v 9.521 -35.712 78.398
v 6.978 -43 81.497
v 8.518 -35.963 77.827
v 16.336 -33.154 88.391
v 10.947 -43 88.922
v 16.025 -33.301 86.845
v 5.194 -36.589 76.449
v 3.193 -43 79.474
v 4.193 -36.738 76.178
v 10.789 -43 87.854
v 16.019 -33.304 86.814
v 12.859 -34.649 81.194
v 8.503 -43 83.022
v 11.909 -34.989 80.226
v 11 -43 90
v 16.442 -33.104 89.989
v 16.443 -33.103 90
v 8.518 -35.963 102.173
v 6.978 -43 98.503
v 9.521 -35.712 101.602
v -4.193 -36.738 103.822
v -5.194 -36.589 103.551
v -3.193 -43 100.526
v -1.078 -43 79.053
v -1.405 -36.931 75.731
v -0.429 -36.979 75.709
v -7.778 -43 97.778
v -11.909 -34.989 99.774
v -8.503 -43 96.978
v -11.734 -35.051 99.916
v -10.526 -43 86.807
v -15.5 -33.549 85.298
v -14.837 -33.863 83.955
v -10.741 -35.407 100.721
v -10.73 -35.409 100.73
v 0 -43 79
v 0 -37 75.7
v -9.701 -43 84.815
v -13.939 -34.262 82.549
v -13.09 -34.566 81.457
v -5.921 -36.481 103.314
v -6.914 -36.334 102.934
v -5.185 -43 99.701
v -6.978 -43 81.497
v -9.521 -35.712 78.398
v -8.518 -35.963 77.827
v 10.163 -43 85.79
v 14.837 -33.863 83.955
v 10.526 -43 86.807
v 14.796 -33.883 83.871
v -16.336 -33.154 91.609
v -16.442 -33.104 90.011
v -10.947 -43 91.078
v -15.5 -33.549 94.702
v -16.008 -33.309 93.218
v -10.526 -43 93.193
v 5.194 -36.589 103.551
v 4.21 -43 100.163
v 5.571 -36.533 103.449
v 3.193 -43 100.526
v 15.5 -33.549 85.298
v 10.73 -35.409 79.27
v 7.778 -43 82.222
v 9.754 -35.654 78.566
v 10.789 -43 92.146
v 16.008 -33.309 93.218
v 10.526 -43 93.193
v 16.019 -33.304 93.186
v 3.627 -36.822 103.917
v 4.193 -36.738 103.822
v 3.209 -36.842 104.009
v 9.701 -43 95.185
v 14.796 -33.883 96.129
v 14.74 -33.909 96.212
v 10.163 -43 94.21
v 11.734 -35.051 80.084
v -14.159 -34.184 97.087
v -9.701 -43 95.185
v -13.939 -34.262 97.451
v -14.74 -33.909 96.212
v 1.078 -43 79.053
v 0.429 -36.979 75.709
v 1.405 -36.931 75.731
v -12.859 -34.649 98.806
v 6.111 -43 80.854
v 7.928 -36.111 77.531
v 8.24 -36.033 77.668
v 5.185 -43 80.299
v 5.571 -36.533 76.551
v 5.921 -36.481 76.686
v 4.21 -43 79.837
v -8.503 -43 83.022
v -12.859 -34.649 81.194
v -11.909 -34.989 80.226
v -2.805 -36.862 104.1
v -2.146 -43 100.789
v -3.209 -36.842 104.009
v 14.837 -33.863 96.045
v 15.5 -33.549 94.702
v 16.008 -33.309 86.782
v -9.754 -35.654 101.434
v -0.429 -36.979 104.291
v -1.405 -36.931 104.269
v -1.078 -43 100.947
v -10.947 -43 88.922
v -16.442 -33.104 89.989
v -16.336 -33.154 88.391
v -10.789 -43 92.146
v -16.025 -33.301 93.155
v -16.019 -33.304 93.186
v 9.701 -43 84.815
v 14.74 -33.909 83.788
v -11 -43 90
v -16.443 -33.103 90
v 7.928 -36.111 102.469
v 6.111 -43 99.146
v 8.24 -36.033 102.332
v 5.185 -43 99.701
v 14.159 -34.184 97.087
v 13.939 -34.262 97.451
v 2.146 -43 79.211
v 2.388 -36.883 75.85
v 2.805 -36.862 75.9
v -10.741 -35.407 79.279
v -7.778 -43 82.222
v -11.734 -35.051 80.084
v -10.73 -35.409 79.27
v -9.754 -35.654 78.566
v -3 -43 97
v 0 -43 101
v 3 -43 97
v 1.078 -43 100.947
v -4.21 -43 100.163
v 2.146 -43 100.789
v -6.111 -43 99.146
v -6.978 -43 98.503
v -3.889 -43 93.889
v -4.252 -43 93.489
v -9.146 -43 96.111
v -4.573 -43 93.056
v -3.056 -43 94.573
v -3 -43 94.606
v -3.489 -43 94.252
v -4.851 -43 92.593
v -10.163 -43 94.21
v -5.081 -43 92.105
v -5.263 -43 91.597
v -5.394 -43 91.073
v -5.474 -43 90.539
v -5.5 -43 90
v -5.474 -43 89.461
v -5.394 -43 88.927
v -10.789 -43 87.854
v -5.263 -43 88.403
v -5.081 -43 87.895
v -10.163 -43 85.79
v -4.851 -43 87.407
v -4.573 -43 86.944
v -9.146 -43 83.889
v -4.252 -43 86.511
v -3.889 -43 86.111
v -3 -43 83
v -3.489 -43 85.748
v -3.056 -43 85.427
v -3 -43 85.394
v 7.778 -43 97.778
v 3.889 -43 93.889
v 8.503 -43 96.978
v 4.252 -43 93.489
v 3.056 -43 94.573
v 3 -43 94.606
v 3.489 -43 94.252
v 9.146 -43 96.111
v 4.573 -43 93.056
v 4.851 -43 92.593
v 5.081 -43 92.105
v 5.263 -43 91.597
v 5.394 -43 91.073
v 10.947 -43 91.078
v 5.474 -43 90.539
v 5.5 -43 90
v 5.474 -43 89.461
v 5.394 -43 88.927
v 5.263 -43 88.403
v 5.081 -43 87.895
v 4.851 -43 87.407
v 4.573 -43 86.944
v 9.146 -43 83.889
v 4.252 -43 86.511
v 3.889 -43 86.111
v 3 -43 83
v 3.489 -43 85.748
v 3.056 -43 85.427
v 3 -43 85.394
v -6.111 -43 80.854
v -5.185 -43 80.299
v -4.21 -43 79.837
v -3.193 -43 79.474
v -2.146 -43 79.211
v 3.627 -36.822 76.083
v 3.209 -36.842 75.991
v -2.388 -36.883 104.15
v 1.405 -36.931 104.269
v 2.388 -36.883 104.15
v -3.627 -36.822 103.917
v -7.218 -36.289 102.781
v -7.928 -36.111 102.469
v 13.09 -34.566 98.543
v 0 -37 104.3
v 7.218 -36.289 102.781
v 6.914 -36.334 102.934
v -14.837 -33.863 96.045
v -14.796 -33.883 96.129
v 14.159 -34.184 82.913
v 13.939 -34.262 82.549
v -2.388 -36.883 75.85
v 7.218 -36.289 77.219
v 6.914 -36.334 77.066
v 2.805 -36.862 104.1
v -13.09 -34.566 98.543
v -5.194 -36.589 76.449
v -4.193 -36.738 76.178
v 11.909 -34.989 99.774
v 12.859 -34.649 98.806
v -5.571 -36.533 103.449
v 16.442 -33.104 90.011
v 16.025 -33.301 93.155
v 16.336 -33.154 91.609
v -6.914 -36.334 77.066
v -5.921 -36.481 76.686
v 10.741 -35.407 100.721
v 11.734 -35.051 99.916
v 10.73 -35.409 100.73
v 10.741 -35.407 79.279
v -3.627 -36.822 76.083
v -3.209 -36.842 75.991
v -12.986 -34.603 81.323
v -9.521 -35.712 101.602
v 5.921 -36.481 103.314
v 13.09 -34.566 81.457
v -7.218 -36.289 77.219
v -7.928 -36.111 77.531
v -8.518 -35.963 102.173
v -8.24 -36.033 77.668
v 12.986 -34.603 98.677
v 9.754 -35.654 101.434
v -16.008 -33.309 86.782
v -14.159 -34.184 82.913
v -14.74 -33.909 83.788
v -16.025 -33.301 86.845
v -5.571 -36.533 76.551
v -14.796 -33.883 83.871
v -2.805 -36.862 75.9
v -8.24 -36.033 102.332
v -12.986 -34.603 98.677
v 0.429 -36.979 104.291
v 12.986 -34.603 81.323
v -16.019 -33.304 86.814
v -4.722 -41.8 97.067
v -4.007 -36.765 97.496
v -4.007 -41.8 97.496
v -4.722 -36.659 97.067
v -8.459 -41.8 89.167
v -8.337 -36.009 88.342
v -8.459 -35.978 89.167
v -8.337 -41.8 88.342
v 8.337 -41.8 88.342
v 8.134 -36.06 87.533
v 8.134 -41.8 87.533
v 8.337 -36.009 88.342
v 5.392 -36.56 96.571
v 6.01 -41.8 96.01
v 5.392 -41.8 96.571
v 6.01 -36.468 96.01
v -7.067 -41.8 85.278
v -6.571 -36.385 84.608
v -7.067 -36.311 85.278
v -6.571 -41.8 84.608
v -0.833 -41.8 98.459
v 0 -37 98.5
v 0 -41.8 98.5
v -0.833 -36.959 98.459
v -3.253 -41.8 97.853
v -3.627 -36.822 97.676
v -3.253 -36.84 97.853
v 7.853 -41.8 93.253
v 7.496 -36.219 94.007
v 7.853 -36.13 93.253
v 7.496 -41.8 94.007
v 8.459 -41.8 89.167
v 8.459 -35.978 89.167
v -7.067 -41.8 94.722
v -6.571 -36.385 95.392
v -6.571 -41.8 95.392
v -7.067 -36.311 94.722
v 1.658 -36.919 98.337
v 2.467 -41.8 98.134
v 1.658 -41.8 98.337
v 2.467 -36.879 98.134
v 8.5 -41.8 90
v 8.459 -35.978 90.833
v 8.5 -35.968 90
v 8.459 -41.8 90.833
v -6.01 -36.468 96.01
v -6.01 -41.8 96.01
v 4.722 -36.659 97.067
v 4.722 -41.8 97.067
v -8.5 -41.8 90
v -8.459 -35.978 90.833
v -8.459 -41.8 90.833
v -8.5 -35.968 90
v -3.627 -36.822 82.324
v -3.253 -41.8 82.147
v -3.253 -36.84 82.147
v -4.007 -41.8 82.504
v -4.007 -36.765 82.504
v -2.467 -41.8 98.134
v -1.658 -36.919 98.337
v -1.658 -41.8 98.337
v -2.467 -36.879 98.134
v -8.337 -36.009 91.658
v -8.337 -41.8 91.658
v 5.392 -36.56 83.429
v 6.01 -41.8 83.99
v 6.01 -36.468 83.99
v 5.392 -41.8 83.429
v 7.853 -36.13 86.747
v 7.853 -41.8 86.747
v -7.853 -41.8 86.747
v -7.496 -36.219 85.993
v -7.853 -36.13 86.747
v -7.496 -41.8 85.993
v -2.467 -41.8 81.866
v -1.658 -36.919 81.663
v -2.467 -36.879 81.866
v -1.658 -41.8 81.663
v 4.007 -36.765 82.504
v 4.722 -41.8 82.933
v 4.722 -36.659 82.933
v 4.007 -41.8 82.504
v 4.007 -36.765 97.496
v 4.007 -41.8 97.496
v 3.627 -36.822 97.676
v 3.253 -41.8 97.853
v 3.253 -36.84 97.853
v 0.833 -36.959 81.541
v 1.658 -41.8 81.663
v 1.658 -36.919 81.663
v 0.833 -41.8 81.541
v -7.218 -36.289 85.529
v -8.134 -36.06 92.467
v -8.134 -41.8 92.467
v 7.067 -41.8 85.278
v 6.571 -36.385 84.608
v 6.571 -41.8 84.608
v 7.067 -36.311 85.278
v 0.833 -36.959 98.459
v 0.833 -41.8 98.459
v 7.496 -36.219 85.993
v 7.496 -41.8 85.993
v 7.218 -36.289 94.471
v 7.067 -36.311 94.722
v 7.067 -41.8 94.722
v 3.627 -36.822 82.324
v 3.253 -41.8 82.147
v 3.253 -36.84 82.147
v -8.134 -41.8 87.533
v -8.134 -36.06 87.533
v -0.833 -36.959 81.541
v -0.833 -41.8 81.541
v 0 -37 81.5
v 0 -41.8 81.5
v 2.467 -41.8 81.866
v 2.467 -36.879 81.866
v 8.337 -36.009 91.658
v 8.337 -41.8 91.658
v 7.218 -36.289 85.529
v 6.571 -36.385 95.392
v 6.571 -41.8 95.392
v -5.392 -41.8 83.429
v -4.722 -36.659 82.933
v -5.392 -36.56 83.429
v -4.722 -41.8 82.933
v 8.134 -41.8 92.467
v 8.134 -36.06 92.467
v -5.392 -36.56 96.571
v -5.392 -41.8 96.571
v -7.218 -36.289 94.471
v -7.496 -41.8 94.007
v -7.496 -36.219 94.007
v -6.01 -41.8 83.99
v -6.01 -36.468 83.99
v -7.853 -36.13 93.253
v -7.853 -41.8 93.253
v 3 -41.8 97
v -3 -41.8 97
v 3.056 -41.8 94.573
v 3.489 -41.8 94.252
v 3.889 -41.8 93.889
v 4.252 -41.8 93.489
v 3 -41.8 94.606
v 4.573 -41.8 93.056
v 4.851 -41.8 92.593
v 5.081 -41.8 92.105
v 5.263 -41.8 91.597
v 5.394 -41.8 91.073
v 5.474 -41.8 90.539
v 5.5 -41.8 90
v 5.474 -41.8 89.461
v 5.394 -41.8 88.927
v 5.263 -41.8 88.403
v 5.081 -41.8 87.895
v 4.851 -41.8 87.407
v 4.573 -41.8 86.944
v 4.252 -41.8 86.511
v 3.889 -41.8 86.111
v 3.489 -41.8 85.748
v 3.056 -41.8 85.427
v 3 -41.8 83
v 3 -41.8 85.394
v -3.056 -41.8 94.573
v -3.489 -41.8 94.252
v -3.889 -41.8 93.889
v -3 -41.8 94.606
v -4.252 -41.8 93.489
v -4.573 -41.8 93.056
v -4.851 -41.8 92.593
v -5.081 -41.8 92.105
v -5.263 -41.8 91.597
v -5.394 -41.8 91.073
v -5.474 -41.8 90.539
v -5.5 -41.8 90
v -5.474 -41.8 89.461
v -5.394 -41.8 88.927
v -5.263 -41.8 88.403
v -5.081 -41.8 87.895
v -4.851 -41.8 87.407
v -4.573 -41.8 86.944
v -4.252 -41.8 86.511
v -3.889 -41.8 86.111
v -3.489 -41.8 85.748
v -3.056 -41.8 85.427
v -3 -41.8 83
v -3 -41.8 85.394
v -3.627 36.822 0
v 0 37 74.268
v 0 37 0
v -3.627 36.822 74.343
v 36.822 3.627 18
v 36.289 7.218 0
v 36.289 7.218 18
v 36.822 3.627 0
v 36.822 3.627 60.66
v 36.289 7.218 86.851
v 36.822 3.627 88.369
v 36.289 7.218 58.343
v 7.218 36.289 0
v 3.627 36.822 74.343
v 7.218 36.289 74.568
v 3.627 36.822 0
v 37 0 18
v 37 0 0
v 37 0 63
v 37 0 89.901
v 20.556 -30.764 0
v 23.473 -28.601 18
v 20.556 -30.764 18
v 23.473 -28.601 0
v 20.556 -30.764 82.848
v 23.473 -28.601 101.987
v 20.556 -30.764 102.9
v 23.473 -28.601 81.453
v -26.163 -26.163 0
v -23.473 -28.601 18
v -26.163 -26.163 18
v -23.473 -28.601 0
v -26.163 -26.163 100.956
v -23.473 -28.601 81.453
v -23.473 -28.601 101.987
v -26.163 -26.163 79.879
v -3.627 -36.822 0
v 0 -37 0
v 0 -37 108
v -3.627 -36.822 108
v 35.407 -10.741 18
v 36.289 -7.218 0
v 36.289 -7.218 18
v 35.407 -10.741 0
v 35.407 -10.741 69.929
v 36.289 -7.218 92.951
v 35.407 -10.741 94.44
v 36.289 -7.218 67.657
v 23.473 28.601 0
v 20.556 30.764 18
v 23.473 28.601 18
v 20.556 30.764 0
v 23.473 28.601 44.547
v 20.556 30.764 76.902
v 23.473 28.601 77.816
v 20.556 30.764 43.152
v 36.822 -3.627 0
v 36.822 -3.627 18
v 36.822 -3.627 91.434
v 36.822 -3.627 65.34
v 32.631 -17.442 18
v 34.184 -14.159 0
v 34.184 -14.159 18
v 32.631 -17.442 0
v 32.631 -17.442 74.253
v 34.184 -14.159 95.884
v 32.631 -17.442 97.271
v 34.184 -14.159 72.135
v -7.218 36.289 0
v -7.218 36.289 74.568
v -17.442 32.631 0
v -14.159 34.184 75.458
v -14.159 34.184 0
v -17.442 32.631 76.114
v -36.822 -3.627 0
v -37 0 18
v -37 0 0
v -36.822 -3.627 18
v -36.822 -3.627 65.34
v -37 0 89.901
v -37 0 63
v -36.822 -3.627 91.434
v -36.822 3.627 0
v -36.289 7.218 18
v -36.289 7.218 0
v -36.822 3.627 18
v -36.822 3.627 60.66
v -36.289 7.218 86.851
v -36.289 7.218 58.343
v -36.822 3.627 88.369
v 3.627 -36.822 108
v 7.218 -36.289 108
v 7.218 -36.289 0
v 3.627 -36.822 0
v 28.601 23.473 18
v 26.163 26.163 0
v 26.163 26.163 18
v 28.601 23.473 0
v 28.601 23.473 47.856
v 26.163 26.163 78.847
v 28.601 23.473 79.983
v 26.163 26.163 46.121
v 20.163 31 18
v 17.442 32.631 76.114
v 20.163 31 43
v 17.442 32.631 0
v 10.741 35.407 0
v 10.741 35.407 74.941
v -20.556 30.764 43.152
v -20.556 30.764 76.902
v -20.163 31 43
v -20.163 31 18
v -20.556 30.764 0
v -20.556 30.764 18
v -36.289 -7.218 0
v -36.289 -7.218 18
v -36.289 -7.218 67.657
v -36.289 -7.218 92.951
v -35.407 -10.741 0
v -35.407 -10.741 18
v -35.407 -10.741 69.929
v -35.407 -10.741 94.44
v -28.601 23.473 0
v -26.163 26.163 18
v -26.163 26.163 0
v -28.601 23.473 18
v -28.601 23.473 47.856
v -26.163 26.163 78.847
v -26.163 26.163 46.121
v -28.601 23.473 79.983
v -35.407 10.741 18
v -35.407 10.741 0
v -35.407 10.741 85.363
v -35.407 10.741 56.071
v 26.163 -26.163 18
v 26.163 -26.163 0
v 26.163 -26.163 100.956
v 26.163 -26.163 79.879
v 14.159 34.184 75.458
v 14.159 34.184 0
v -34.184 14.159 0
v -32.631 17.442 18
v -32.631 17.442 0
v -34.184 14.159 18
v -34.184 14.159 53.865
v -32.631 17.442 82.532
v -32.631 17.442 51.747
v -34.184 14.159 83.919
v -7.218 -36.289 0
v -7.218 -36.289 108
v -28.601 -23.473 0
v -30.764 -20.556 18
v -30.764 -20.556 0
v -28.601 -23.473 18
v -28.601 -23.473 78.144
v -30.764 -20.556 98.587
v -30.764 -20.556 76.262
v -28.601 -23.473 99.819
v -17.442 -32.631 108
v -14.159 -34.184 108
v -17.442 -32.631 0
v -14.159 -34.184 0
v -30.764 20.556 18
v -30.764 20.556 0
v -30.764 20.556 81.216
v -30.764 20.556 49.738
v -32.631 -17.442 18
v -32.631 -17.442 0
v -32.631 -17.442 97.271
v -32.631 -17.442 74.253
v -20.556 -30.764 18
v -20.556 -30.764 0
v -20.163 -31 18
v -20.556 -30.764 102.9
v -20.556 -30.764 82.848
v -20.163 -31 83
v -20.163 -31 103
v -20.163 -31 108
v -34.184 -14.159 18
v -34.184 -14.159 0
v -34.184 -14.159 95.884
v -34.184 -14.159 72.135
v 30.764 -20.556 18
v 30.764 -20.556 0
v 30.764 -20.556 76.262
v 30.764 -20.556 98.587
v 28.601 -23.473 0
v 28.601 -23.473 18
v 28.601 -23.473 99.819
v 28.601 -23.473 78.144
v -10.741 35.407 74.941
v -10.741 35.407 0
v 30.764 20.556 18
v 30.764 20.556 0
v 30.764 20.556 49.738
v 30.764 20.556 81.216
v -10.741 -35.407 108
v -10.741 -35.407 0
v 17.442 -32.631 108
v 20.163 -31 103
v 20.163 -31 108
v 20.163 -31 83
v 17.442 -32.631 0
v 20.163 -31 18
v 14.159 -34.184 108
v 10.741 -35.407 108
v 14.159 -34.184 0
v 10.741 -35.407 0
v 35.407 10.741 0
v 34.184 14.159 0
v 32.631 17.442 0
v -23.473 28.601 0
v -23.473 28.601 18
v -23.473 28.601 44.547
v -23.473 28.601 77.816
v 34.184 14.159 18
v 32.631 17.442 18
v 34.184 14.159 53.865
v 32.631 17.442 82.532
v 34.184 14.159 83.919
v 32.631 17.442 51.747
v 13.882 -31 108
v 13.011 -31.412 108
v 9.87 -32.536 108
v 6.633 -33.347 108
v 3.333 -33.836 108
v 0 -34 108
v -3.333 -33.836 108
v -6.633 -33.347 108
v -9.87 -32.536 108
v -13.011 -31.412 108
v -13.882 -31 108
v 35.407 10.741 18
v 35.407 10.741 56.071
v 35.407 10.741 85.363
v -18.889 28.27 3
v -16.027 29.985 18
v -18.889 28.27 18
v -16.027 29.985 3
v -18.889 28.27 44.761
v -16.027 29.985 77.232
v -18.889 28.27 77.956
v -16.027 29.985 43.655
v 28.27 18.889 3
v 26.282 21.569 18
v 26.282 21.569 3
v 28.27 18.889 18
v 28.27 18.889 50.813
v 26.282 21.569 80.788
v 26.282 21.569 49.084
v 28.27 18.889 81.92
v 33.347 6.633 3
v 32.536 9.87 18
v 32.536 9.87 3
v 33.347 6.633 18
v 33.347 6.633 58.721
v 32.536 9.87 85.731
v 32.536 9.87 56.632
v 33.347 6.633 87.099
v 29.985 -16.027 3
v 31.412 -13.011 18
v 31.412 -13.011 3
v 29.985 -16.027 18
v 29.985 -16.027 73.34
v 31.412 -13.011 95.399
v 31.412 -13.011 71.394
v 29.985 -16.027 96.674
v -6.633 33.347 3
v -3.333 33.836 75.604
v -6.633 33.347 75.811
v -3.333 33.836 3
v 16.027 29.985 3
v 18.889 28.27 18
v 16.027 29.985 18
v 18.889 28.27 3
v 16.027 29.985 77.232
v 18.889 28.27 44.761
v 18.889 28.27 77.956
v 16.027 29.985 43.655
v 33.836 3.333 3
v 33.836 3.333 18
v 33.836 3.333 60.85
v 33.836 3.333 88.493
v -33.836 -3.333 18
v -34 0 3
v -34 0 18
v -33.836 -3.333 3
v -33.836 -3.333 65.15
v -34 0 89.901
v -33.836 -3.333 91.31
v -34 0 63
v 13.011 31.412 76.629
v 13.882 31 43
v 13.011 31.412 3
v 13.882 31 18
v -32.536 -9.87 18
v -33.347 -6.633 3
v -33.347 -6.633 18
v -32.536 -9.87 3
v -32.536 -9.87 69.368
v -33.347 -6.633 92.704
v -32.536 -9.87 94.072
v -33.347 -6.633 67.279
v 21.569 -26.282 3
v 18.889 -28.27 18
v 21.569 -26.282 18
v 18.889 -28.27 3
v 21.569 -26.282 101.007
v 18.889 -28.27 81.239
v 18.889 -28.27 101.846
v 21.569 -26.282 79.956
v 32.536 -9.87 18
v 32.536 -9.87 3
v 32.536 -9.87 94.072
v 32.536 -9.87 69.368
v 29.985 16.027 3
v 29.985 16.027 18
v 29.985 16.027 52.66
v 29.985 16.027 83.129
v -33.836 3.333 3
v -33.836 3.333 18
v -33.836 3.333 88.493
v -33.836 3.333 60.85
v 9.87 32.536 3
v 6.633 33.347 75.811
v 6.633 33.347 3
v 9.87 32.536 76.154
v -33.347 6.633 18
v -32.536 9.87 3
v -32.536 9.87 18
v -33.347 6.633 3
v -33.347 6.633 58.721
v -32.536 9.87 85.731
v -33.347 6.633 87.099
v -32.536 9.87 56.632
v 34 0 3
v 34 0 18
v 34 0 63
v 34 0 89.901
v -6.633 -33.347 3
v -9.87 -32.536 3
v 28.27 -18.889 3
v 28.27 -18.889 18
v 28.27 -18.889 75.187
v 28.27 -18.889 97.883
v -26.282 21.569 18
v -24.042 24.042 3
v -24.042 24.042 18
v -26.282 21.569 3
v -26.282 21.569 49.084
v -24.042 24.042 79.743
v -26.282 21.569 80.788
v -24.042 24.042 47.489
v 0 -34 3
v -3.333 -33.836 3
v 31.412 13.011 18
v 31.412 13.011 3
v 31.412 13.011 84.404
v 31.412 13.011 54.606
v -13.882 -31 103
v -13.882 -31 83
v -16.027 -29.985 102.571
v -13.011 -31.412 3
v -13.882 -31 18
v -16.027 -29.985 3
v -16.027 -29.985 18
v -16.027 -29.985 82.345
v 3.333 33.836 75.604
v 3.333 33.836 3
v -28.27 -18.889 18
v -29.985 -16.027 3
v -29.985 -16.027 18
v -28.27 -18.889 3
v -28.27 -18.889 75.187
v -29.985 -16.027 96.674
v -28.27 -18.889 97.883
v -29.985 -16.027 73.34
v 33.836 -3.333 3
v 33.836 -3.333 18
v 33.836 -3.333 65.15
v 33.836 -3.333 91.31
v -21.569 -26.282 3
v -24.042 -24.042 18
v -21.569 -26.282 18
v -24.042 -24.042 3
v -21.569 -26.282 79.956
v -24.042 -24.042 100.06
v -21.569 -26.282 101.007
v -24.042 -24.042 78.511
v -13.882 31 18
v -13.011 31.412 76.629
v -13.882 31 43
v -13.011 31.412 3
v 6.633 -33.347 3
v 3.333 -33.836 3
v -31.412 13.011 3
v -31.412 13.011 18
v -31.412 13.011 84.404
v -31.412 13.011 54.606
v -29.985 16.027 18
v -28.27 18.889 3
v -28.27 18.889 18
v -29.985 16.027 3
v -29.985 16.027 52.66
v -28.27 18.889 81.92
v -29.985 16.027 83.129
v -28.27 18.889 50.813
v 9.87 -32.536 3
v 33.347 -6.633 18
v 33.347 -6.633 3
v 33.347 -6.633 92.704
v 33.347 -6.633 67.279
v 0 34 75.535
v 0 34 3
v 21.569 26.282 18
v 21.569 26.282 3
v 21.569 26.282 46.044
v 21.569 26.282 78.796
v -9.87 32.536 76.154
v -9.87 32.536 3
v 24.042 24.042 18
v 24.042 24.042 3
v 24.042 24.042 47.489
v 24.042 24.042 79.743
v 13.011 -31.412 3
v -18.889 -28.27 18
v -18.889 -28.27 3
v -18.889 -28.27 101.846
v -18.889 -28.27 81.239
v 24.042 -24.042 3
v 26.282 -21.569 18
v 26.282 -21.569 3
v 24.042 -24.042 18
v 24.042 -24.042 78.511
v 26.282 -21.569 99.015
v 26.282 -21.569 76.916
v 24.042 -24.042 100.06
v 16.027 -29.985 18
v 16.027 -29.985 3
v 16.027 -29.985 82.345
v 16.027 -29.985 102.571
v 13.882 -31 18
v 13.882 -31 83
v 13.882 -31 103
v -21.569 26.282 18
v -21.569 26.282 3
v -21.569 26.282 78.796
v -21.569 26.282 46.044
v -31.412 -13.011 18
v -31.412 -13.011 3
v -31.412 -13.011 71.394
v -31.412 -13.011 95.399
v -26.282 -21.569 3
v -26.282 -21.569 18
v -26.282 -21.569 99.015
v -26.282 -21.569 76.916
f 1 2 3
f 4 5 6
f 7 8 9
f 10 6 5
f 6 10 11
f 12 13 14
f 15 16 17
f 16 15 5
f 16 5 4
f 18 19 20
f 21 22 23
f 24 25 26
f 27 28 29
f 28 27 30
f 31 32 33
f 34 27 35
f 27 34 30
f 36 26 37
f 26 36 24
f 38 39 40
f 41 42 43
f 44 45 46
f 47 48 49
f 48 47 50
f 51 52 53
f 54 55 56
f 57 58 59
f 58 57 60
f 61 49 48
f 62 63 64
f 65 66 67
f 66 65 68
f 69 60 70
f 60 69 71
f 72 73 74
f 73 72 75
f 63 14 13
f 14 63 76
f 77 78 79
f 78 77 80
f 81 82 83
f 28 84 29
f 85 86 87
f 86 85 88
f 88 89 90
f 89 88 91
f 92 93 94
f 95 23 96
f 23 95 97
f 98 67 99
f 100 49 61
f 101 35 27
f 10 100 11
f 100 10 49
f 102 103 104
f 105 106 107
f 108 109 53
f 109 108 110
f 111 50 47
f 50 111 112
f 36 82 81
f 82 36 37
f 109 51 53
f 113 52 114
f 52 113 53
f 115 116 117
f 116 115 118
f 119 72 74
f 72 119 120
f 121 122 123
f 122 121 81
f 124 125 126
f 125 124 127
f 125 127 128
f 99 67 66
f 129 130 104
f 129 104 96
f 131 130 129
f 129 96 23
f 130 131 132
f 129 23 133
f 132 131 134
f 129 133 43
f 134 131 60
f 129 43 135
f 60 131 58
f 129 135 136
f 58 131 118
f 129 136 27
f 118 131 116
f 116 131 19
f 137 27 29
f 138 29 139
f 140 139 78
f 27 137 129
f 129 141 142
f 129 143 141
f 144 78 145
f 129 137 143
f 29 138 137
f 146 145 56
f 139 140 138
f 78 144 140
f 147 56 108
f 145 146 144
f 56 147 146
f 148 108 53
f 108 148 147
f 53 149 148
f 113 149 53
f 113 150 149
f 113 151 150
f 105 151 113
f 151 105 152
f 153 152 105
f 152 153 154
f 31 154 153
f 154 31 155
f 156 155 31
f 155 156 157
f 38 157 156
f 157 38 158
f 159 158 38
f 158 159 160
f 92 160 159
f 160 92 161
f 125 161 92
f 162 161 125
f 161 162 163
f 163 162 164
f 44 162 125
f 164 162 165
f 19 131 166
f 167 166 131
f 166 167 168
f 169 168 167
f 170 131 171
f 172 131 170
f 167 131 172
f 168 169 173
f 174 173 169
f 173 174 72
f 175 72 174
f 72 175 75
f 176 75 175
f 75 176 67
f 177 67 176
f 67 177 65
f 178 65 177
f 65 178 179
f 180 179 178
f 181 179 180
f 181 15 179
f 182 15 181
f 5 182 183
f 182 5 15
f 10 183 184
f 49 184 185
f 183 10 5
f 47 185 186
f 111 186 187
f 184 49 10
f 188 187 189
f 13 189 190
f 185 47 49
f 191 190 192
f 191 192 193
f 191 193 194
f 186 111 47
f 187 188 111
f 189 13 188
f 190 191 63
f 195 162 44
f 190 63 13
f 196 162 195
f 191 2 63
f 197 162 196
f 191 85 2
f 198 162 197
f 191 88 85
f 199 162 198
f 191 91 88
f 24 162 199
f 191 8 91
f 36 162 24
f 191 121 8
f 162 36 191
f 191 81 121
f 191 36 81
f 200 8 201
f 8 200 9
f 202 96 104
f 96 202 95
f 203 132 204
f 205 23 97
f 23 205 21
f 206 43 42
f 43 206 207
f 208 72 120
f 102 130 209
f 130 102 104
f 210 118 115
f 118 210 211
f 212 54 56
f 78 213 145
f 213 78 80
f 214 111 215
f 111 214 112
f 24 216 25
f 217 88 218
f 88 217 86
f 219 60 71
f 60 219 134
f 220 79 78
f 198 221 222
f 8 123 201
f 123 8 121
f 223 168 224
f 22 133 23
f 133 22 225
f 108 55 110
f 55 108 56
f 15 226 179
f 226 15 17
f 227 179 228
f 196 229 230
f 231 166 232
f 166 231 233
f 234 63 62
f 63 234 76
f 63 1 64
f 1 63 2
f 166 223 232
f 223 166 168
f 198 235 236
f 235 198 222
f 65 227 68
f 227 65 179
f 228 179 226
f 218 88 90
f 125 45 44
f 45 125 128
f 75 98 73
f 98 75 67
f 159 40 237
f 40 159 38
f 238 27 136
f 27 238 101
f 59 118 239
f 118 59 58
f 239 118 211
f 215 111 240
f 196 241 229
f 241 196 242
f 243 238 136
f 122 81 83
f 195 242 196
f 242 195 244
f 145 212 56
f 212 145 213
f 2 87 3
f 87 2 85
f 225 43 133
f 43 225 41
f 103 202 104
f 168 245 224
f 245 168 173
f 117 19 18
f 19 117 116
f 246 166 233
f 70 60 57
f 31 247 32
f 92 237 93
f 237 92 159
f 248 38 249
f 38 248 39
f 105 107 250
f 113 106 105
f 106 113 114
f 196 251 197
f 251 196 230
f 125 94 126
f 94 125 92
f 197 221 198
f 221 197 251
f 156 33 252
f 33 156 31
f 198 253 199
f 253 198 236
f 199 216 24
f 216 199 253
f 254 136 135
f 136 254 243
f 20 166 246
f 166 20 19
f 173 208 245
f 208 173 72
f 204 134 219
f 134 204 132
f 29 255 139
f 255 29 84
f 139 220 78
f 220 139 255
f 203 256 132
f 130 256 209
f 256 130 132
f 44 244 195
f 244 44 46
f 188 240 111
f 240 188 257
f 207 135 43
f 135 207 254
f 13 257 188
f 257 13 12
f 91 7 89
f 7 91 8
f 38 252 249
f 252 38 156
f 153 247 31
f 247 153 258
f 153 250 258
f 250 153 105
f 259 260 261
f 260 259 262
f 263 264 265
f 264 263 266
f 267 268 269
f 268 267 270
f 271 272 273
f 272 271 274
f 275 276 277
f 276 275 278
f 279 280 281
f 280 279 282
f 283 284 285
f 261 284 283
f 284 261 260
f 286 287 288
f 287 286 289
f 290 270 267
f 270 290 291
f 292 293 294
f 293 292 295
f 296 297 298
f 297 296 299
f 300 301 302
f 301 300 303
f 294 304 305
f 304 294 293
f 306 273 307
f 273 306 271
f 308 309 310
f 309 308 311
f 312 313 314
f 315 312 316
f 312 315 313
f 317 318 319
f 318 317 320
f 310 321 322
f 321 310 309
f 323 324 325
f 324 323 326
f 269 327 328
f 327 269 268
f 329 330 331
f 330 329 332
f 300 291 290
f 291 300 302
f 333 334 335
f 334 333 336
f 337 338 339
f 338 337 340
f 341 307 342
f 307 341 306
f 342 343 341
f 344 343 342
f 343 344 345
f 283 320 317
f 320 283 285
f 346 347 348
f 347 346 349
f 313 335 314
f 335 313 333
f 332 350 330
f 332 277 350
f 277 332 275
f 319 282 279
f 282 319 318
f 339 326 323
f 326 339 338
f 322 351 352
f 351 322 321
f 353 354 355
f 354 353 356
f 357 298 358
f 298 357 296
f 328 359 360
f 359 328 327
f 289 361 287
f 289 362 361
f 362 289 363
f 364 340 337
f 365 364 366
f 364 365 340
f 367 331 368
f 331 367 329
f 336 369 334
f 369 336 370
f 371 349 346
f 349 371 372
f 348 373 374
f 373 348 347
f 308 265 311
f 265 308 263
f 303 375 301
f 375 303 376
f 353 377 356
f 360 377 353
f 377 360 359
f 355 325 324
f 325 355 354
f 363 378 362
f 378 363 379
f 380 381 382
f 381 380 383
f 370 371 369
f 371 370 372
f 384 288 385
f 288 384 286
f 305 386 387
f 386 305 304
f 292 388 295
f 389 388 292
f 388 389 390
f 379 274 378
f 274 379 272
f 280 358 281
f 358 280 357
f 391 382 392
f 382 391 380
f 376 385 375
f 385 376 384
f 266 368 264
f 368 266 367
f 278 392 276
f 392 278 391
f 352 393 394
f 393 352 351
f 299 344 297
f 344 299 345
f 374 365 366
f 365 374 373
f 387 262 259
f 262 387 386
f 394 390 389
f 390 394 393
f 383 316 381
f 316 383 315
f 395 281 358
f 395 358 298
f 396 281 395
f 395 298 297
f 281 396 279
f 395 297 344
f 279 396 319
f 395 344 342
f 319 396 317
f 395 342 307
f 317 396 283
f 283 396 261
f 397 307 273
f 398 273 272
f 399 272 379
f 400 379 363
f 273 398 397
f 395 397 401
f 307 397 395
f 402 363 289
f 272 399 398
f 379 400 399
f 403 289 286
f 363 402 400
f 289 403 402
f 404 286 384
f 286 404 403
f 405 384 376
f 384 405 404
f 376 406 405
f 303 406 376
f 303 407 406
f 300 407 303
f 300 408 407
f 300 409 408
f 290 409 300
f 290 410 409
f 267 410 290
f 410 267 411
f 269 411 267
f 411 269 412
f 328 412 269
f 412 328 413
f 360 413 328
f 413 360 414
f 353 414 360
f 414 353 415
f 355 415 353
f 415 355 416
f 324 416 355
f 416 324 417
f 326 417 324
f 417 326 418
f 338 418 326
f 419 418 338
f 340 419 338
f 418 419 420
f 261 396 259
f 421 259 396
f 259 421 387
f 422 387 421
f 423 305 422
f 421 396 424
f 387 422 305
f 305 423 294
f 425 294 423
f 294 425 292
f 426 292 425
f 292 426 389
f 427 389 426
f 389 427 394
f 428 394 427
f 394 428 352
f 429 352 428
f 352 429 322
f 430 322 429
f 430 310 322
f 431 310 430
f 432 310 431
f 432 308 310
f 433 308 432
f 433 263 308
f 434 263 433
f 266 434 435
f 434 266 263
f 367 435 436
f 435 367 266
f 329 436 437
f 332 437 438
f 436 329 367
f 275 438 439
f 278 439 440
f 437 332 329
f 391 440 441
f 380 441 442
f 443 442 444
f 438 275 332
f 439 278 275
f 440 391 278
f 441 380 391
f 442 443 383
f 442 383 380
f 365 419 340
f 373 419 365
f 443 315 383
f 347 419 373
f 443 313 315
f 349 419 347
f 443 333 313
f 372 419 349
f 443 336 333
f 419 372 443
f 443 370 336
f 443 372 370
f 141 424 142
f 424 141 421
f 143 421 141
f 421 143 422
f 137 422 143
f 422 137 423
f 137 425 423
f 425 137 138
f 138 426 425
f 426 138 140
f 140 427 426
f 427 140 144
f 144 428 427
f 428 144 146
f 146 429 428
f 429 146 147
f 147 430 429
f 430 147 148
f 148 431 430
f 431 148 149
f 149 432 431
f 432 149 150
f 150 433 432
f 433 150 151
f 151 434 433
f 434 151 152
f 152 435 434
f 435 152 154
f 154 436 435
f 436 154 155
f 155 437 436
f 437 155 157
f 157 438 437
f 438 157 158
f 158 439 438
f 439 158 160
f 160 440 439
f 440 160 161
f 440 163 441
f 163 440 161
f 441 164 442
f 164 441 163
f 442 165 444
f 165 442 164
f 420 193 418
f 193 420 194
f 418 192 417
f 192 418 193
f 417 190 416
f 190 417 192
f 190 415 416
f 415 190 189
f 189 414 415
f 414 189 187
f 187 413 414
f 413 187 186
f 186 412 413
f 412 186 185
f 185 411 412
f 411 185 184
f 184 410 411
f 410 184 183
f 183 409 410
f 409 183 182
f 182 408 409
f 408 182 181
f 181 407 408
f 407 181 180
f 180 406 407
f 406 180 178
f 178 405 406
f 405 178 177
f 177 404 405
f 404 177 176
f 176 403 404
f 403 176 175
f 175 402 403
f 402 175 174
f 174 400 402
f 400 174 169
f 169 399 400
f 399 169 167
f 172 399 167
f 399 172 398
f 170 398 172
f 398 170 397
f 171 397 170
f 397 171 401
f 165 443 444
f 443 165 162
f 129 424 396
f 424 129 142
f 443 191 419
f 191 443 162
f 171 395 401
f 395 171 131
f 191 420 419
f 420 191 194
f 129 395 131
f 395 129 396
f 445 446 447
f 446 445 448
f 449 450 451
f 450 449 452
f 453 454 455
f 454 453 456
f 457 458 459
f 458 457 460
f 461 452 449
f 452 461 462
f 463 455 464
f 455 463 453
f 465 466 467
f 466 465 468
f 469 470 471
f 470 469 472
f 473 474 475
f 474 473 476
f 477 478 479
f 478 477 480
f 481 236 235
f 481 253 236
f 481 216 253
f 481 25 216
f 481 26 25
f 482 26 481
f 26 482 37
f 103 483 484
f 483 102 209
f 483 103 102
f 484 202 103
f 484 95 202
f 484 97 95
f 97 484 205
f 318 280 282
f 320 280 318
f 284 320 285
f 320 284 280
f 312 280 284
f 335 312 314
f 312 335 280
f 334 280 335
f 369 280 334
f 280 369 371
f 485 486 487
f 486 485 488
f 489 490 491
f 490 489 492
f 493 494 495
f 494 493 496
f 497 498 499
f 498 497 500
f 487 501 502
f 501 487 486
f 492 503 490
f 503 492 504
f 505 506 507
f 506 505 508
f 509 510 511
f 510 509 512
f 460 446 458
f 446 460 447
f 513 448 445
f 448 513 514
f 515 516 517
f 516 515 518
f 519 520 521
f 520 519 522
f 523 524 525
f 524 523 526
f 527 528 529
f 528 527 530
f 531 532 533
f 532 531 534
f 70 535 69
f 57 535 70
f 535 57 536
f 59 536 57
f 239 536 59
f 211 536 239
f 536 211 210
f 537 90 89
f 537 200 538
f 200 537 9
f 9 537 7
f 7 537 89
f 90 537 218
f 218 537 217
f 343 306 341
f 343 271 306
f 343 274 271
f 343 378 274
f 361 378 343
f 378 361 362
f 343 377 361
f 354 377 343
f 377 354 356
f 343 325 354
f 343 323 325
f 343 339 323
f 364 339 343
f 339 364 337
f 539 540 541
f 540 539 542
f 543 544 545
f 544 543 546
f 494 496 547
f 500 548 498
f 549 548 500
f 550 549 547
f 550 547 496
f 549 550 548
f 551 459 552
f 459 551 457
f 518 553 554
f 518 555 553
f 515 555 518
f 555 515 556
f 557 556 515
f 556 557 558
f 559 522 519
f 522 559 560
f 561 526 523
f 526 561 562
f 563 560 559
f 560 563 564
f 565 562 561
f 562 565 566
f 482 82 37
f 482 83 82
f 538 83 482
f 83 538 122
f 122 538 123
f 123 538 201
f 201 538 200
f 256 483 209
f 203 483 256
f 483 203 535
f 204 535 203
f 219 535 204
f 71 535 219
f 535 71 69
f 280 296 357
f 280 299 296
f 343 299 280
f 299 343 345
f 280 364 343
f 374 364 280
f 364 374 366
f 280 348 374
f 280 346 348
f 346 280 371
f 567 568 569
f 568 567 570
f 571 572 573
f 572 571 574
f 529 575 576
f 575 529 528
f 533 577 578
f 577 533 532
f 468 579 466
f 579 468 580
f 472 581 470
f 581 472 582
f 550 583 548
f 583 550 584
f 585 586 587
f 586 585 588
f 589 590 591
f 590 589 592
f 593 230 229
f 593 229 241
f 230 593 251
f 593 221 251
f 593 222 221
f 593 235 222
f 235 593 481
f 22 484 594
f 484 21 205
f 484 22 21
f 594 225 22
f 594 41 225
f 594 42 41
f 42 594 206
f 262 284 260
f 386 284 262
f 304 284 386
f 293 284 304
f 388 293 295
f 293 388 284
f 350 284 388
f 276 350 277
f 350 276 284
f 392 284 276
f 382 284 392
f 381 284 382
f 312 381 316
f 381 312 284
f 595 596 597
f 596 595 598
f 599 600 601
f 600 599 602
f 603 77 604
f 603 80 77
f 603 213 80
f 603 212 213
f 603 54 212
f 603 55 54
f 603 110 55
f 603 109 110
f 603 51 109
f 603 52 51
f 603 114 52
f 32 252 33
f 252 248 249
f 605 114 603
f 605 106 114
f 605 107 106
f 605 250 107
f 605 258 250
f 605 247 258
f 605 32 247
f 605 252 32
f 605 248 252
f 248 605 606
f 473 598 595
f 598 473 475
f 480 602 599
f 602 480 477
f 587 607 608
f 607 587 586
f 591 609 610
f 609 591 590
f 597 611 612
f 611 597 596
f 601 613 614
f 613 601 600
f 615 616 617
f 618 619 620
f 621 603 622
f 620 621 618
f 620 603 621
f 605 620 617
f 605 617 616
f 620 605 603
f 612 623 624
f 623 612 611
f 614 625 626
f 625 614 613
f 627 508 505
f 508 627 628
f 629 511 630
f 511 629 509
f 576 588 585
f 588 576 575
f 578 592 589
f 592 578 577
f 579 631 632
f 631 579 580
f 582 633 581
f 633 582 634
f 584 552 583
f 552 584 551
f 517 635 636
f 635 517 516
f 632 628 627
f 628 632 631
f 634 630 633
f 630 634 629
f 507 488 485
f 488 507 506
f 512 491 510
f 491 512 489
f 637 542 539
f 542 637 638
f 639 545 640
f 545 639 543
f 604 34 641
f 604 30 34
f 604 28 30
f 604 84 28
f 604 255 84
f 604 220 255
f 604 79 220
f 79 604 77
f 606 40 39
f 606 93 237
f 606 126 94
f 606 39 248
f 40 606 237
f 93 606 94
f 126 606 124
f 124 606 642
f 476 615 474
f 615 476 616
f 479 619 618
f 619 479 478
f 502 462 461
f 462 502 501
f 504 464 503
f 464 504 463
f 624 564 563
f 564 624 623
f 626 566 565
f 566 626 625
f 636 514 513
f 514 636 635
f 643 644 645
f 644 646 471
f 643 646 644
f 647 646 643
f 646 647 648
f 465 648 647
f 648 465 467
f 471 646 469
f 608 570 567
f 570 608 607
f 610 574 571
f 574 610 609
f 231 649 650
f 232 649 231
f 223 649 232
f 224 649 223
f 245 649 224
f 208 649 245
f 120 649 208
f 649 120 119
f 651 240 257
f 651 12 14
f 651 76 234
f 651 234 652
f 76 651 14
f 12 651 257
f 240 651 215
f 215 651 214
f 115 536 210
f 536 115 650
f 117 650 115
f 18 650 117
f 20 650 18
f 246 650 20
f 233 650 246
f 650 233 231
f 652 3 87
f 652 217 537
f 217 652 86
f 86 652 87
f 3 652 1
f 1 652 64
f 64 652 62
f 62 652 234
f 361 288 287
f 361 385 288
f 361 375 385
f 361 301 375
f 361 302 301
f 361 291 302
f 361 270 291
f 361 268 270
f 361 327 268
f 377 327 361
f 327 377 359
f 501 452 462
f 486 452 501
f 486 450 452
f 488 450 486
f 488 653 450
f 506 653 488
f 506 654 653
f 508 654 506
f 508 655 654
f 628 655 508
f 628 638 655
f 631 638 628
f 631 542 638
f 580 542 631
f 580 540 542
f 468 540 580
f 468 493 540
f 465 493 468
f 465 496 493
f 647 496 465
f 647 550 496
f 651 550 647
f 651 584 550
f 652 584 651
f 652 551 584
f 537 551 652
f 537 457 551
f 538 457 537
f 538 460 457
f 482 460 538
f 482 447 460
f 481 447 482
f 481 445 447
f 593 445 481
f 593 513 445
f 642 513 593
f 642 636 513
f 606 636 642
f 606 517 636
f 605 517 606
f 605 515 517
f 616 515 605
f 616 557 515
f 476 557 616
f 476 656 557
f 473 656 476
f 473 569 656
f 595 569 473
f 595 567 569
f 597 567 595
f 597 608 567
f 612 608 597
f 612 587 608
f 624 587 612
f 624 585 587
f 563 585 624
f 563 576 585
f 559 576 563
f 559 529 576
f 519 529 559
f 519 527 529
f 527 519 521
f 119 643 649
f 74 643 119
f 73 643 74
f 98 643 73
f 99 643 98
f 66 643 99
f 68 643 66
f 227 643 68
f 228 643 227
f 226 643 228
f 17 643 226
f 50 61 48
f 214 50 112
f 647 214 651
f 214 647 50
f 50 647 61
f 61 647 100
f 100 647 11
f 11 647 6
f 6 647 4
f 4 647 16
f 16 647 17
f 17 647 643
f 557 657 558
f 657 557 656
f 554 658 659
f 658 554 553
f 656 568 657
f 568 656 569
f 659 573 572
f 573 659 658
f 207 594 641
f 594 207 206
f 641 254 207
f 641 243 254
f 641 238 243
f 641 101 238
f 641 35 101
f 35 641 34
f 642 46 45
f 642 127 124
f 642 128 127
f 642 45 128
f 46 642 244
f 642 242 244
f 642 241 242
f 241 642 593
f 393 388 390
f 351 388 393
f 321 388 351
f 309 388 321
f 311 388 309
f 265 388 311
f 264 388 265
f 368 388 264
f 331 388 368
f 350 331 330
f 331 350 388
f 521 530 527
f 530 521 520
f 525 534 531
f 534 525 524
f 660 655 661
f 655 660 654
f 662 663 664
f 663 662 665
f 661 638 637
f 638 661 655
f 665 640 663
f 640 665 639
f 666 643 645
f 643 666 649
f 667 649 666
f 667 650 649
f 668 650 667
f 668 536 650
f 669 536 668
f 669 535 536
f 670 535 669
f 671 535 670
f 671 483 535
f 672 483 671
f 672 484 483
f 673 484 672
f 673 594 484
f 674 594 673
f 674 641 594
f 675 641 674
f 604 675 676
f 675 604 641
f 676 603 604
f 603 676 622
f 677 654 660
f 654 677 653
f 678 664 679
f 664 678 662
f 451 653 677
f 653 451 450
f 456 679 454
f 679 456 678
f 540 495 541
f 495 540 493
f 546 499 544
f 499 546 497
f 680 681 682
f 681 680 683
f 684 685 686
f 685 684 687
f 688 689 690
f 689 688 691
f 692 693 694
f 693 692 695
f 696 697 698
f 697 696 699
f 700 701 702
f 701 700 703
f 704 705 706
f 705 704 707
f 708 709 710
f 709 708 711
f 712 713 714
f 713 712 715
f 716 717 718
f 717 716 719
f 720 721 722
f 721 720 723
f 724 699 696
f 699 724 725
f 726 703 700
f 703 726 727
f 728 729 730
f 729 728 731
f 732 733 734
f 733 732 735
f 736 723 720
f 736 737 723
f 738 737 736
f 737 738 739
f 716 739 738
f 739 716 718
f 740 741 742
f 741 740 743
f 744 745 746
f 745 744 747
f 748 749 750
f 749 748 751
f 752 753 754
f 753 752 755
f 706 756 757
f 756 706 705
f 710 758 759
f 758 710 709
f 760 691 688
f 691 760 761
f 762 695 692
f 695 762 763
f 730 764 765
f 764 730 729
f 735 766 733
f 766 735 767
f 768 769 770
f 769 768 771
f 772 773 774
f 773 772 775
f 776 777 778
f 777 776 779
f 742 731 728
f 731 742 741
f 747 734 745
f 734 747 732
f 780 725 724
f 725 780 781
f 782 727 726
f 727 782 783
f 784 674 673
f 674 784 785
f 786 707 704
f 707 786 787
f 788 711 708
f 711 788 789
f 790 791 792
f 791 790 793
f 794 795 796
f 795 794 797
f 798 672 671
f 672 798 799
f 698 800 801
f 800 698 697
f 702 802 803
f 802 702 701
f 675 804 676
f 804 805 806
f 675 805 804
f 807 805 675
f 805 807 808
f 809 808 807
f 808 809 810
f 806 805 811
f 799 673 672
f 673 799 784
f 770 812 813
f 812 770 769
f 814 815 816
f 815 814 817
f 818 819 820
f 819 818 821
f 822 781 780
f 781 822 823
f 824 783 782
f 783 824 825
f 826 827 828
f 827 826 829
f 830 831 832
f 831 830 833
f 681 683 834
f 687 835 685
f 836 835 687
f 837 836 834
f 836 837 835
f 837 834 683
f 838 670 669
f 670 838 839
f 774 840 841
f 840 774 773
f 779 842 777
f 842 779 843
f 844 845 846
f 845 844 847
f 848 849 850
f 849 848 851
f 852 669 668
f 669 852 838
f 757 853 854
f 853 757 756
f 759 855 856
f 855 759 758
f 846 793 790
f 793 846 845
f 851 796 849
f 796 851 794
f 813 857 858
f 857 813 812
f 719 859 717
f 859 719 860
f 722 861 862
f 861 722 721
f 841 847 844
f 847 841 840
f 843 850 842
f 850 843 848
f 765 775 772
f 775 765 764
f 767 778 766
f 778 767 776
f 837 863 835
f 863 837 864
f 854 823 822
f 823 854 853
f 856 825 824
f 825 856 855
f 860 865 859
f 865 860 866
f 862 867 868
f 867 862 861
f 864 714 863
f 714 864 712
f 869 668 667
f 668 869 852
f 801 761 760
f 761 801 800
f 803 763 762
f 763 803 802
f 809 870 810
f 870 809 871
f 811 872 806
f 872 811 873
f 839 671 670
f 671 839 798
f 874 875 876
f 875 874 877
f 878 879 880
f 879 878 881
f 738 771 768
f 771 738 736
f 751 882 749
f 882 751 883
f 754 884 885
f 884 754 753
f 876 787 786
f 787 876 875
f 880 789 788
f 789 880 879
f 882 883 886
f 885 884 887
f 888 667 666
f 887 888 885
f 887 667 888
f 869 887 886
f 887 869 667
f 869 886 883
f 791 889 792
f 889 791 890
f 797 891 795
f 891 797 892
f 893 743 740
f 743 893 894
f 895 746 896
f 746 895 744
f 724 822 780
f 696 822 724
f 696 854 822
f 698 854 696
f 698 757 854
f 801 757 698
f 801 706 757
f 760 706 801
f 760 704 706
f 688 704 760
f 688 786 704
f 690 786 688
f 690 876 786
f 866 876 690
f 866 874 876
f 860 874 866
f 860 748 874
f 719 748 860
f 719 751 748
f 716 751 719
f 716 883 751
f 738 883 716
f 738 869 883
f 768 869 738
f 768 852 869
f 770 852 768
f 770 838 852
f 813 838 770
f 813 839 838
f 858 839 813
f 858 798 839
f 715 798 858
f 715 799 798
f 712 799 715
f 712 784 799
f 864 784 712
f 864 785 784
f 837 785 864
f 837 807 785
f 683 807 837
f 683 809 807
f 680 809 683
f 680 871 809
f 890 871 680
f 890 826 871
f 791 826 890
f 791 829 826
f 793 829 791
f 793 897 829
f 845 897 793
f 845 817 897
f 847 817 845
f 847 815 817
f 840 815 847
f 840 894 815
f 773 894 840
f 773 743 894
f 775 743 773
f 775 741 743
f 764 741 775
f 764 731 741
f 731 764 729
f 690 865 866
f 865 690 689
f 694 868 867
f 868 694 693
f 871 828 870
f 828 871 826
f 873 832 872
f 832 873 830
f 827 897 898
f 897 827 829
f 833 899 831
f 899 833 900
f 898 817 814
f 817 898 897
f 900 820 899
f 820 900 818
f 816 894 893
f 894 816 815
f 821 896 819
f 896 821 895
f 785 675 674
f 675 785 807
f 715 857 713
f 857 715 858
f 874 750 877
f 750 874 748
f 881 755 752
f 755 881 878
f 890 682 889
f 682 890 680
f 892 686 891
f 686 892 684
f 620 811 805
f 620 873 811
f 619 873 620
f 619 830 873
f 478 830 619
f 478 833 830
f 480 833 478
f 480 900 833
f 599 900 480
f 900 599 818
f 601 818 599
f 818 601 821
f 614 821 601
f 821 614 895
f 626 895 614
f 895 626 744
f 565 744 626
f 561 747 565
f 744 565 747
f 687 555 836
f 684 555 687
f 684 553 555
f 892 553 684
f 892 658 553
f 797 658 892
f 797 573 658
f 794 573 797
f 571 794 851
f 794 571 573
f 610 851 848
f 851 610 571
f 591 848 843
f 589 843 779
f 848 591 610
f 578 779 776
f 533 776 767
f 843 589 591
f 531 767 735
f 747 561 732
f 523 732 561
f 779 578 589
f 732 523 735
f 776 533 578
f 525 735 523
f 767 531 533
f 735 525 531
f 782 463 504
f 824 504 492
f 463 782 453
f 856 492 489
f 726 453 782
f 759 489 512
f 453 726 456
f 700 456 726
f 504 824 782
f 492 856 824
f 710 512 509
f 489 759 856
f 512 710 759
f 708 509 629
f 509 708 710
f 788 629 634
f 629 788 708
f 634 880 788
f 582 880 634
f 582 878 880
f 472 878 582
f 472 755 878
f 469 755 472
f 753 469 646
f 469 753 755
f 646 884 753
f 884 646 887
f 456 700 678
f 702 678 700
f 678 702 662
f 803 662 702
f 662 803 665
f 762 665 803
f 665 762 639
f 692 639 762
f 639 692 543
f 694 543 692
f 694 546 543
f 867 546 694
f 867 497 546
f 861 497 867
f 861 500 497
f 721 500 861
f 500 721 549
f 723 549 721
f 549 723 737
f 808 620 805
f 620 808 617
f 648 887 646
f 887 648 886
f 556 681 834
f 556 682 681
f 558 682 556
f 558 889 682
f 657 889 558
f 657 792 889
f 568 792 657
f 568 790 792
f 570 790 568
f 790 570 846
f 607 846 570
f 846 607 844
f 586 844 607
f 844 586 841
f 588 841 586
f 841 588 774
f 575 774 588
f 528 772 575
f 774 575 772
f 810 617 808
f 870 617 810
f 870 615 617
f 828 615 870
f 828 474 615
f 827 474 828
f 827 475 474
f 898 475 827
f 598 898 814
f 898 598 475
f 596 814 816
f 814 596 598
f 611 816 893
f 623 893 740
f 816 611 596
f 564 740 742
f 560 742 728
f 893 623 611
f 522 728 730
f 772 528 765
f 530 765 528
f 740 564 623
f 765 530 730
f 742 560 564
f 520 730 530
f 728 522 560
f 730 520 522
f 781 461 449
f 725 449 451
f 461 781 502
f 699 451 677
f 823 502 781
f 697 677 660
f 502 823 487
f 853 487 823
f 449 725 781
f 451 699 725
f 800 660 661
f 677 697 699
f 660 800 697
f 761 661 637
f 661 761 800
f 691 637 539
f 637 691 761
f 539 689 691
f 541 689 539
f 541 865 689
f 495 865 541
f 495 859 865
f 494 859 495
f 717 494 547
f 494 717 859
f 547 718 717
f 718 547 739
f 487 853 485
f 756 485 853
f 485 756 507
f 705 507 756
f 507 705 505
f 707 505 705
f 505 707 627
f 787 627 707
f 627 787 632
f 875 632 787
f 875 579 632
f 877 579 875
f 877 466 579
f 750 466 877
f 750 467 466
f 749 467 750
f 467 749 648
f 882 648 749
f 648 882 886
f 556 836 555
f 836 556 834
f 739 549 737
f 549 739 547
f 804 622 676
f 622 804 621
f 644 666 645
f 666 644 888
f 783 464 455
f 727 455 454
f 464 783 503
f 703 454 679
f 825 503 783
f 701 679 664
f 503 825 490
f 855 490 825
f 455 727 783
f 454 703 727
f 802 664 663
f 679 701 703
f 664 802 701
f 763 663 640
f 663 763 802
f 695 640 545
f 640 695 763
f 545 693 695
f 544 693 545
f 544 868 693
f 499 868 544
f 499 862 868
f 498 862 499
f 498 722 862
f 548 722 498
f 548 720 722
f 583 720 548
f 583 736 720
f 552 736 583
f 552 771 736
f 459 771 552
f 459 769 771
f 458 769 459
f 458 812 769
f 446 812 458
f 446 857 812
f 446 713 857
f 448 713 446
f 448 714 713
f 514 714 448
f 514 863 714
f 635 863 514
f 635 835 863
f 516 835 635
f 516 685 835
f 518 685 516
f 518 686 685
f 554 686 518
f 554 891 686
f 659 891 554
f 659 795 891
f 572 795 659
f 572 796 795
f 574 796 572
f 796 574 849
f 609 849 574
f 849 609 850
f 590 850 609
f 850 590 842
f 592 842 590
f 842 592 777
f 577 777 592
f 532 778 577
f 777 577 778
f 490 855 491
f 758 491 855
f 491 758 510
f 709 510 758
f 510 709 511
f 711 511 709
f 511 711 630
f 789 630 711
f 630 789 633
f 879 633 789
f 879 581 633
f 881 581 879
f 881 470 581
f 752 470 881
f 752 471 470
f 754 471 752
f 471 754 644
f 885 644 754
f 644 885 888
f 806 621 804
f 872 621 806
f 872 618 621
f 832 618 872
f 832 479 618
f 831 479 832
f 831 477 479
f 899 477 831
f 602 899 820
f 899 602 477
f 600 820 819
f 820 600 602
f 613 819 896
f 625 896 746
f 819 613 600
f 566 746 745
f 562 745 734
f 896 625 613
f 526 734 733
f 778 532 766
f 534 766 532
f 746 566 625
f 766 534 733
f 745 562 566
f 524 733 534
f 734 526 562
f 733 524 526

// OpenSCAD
// file: connector_female.scad
module connector_female(thickness=3, height=5, scale=1) {
    difference() {
        union() {
            difference() {
                linear_extrude(height, scale=scale) circle(16/2 + thickness);
                linear_extrude(height+0.1) circle(17/2);
            }
            
            linear_extrude(1.2) {
                difference() {
                    circle(16/2 + thickness);
                    circle(11/2);
                }
            }
        }

        linear_extrude(10, center=true)
        square([6,14], true);
    }
}

connector_female();
// main file
$fn = 64;
use <connector_female.scad>;

thickness = 3;

difference() {
    
    
    //Main Cylinder 
    difference() {
        union() {
            linear_extrude(105 + thickness) { circle(34 + thickness); }
            translate([0,-43,90]) rotate([-90,0,0]) connector_female(height=10, scale=1.5);
        }
        translate([0,0, thickness]) { linear_extrude(121) { circle(34); } }
    };

    //Lower Cut in Cylinder
    rotate([0,-90,0]) {
        linear_extrude(100, center=true) {
            polygon([
                [15 + thickness, -31],
                [80 + thickness, -31],
                [40 + thickness, 31],
                [15 + thickness, 31]
            ]);
        }
    }
    
    //Upper Cut in Cylinder
    rotate([0,-90,0]) {
        linear_extrude(100, center=true) {
            polygon([
                [100 + thickness, -31],
                [120 + thickness, -31],
                [120 + thickness, 40],
                [70  + thickness, 40]
            ]);
        }
    }
}
